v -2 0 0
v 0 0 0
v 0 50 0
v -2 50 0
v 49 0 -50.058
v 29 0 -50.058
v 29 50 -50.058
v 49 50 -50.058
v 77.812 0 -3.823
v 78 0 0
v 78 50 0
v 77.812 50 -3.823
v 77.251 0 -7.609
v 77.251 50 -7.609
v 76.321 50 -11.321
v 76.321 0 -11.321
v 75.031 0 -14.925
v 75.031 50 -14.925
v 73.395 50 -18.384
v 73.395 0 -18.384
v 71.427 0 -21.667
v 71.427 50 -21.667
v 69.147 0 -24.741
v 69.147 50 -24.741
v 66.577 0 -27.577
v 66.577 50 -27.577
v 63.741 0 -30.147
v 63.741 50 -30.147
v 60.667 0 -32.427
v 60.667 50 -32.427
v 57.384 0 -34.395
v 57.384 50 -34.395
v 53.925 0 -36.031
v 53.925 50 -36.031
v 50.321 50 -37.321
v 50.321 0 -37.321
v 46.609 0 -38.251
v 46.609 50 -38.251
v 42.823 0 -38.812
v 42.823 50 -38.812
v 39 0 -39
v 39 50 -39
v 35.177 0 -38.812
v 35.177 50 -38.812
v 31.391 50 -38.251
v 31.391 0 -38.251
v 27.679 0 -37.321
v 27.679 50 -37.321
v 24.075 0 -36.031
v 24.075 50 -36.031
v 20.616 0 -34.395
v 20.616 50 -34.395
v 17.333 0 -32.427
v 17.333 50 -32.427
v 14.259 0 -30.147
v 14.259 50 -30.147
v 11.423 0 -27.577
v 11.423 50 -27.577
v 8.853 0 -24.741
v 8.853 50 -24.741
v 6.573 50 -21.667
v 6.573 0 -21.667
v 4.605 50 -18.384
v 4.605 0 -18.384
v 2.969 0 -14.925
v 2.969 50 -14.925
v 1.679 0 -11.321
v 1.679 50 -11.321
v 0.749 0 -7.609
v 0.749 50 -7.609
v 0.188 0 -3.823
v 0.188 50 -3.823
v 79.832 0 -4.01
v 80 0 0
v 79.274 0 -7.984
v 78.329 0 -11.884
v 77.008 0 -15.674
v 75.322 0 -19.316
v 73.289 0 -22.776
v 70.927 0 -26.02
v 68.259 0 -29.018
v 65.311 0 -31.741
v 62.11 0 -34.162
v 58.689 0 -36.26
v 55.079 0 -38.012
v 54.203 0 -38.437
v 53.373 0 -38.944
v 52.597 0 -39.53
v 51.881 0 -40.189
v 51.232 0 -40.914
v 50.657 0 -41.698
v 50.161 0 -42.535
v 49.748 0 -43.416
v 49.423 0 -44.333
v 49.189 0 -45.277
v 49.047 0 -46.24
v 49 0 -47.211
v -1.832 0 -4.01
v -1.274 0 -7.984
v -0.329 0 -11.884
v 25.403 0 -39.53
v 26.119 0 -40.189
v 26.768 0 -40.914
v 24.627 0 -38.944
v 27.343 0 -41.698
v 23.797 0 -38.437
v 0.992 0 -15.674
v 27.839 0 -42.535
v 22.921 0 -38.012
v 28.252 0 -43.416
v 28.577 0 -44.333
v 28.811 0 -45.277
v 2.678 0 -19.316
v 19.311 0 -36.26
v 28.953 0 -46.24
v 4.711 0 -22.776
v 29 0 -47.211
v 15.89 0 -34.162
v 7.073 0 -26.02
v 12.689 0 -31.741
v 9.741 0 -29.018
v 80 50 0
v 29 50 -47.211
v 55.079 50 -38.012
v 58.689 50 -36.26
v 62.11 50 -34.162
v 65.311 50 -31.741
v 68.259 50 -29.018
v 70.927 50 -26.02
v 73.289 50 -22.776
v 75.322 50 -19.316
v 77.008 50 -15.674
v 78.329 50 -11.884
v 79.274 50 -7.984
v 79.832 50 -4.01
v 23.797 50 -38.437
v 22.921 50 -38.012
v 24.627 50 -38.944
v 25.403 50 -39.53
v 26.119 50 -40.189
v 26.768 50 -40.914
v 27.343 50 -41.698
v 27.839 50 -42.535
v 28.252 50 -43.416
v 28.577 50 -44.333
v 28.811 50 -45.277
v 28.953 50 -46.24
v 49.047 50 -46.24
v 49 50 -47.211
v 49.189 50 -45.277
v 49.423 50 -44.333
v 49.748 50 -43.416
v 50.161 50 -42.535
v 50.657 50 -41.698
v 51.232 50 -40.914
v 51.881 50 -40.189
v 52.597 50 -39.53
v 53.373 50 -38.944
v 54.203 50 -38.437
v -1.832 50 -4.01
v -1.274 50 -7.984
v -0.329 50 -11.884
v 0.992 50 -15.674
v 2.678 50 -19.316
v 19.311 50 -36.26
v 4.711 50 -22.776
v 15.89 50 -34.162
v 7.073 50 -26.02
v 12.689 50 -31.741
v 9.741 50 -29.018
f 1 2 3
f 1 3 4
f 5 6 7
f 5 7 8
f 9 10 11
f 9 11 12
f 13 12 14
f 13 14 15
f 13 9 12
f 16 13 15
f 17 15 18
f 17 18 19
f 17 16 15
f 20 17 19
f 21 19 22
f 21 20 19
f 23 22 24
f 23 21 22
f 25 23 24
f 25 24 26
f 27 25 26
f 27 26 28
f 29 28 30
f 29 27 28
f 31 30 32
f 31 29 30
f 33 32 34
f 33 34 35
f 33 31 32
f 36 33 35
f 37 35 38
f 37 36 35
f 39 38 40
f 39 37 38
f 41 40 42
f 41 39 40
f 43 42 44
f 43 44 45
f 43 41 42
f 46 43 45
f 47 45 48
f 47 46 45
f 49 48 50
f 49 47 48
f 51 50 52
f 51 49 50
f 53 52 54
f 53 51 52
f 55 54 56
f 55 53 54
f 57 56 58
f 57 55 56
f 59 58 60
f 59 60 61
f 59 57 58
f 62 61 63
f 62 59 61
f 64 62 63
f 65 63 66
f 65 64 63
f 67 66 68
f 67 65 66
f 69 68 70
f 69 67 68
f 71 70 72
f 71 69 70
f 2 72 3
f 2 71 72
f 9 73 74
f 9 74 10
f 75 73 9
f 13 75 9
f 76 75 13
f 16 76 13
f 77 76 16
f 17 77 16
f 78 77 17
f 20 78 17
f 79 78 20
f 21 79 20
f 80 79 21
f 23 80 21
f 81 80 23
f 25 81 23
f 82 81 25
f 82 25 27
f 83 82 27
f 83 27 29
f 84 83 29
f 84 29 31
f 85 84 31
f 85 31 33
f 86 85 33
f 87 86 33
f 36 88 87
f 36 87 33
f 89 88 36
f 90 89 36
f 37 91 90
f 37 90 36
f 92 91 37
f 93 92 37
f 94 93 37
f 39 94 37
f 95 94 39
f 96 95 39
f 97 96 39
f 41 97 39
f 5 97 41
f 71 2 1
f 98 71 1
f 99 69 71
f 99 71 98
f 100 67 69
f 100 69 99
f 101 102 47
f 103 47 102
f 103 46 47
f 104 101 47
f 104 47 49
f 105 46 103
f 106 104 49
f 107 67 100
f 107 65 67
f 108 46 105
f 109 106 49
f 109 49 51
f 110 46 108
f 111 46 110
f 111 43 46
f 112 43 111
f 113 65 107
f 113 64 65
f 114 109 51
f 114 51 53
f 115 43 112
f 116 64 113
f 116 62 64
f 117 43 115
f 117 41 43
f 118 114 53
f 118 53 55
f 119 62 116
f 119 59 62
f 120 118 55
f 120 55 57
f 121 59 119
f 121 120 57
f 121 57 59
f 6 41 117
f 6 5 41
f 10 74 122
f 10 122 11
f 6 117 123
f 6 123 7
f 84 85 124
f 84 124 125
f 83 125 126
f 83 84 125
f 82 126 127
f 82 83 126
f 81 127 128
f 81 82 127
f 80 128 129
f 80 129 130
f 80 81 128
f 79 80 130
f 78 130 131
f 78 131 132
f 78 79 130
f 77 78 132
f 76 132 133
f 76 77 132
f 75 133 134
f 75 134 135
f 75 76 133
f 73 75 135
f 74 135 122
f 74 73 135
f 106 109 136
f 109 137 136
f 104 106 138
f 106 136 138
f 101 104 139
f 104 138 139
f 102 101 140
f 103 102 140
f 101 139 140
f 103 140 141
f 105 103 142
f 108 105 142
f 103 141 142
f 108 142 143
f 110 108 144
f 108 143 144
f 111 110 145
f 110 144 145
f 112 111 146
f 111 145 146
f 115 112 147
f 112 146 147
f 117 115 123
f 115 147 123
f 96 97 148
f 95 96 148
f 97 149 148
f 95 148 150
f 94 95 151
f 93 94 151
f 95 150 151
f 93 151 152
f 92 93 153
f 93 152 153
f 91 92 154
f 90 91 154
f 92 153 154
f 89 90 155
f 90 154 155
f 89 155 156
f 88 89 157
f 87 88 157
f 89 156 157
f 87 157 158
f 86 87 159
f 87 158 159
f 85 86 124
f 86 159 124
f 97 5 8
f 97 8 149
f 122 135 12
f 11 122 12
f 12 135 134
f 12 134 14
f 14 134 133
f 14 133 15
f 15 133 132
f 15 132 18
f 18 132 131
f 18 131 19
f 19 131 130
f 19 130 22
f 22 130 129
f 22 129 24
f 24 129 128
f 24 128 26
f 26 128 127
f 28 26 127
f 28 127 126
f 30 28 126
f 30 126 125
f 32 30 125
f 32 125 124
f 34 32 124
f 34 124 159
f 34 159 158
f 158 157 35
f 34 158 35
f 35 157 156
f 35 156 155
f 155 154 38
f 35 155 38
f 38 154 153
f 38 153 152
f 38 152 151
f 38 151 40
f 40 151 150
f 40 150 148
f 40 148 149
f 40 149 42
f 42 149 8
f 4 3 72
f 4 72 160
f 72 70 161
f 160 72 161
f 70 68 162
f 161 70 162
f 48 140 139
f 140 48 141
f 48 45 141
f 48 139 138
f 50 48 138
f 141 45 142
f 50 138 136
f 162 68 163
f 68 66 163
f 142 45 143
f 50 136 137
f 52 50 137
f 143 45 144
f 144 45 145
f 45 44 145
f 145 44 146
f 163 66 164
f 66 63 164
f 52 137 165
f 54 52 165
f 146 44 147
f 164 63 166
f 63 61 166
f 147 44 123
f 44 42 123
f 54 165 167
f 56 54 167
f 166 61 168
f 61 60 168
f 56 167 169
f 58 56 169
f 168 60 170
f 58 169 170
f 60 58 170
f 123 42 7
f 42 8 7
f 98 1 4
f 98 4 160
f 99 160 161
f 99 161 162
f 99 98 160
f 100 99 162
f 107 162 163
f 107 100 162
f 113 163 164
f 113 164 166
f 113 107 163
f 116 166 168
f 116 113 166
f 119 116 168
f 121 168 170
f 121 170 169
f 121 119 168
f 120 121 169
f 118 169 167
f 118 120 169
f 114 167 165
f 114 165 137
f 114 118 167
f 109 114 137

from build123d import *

# Parameters (mm, degrees)
BOSS_EXTRU_1_DEPTH = 50
CONG_1_R           = 10


with BuildPart() as part:
    # Esquisse1 → Boss.-Extru.1 (new body)
    with BuildSketch(Plane(origin=(0, 0, 0), x_dir=(1, 0, 0), z_dir=(0, 1, 0))):
        with BuildLine():
            Line((0, 0), (-2, 0))
            ThreePointArc((-2, 0), (6.574510491, 25.388511074), (29, 40.058076335))
            Line((29, 40.058076335), (29, 50.058076335))
            Line((29, 50.058076335), (49, 50.058076335))
            Line((49, 50.058076335), (49, 40.058076335))
            ThreePointArc((49, 40.058076335), (71.425489509, 25.388511074), (80, 0))
            Line((80, 0), (78, 0))
            ThreePointArc((78, 0), (39, 39), (0, 0))
        make_face()
    extrude(amount=BOSS_EXTRU_1_DEPTH)

    # Congé1
    cong_1_edges = [part.edges().sort_by_distance(p)[0] for p in [
        (29, 25, -40.058076335),
        (49, 25, -40.058076335),
    ]]
    fillet(cong_1_edges, radius=CONG_1_R)


solid = part.part
